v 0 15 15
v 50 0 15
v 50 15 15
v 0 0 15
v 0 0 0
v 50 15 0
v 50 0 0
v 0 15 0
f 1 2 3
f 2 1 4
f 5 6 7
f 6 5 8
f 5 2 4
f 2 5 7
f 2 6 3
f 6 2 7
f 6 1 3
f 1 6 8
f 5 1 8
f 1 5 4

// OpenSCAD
//Fischfutteradapter
$fn=36;
//Spalt
sp=3.5;
//Höhe Rand
hr=18.8;
//Erhöhung
er=hr;
//Höhe Halter
hh=30;
//Breite Halter
bh=50;
//Tiefe Halter
th=15;

module halter()
{
    cube([bh, th, hh]);
}

module randadapter()
{
    difference()
    {
        cube([bh, th, hr]);
        //Schlitz
        translate([0, th/2, ,0])
        cube([bh, sp, hr]);
    }
}

//randadapter();
//translate([0,0,hr])
//halter();

//Verlängerung
cube([bh, th, hh/2]);
